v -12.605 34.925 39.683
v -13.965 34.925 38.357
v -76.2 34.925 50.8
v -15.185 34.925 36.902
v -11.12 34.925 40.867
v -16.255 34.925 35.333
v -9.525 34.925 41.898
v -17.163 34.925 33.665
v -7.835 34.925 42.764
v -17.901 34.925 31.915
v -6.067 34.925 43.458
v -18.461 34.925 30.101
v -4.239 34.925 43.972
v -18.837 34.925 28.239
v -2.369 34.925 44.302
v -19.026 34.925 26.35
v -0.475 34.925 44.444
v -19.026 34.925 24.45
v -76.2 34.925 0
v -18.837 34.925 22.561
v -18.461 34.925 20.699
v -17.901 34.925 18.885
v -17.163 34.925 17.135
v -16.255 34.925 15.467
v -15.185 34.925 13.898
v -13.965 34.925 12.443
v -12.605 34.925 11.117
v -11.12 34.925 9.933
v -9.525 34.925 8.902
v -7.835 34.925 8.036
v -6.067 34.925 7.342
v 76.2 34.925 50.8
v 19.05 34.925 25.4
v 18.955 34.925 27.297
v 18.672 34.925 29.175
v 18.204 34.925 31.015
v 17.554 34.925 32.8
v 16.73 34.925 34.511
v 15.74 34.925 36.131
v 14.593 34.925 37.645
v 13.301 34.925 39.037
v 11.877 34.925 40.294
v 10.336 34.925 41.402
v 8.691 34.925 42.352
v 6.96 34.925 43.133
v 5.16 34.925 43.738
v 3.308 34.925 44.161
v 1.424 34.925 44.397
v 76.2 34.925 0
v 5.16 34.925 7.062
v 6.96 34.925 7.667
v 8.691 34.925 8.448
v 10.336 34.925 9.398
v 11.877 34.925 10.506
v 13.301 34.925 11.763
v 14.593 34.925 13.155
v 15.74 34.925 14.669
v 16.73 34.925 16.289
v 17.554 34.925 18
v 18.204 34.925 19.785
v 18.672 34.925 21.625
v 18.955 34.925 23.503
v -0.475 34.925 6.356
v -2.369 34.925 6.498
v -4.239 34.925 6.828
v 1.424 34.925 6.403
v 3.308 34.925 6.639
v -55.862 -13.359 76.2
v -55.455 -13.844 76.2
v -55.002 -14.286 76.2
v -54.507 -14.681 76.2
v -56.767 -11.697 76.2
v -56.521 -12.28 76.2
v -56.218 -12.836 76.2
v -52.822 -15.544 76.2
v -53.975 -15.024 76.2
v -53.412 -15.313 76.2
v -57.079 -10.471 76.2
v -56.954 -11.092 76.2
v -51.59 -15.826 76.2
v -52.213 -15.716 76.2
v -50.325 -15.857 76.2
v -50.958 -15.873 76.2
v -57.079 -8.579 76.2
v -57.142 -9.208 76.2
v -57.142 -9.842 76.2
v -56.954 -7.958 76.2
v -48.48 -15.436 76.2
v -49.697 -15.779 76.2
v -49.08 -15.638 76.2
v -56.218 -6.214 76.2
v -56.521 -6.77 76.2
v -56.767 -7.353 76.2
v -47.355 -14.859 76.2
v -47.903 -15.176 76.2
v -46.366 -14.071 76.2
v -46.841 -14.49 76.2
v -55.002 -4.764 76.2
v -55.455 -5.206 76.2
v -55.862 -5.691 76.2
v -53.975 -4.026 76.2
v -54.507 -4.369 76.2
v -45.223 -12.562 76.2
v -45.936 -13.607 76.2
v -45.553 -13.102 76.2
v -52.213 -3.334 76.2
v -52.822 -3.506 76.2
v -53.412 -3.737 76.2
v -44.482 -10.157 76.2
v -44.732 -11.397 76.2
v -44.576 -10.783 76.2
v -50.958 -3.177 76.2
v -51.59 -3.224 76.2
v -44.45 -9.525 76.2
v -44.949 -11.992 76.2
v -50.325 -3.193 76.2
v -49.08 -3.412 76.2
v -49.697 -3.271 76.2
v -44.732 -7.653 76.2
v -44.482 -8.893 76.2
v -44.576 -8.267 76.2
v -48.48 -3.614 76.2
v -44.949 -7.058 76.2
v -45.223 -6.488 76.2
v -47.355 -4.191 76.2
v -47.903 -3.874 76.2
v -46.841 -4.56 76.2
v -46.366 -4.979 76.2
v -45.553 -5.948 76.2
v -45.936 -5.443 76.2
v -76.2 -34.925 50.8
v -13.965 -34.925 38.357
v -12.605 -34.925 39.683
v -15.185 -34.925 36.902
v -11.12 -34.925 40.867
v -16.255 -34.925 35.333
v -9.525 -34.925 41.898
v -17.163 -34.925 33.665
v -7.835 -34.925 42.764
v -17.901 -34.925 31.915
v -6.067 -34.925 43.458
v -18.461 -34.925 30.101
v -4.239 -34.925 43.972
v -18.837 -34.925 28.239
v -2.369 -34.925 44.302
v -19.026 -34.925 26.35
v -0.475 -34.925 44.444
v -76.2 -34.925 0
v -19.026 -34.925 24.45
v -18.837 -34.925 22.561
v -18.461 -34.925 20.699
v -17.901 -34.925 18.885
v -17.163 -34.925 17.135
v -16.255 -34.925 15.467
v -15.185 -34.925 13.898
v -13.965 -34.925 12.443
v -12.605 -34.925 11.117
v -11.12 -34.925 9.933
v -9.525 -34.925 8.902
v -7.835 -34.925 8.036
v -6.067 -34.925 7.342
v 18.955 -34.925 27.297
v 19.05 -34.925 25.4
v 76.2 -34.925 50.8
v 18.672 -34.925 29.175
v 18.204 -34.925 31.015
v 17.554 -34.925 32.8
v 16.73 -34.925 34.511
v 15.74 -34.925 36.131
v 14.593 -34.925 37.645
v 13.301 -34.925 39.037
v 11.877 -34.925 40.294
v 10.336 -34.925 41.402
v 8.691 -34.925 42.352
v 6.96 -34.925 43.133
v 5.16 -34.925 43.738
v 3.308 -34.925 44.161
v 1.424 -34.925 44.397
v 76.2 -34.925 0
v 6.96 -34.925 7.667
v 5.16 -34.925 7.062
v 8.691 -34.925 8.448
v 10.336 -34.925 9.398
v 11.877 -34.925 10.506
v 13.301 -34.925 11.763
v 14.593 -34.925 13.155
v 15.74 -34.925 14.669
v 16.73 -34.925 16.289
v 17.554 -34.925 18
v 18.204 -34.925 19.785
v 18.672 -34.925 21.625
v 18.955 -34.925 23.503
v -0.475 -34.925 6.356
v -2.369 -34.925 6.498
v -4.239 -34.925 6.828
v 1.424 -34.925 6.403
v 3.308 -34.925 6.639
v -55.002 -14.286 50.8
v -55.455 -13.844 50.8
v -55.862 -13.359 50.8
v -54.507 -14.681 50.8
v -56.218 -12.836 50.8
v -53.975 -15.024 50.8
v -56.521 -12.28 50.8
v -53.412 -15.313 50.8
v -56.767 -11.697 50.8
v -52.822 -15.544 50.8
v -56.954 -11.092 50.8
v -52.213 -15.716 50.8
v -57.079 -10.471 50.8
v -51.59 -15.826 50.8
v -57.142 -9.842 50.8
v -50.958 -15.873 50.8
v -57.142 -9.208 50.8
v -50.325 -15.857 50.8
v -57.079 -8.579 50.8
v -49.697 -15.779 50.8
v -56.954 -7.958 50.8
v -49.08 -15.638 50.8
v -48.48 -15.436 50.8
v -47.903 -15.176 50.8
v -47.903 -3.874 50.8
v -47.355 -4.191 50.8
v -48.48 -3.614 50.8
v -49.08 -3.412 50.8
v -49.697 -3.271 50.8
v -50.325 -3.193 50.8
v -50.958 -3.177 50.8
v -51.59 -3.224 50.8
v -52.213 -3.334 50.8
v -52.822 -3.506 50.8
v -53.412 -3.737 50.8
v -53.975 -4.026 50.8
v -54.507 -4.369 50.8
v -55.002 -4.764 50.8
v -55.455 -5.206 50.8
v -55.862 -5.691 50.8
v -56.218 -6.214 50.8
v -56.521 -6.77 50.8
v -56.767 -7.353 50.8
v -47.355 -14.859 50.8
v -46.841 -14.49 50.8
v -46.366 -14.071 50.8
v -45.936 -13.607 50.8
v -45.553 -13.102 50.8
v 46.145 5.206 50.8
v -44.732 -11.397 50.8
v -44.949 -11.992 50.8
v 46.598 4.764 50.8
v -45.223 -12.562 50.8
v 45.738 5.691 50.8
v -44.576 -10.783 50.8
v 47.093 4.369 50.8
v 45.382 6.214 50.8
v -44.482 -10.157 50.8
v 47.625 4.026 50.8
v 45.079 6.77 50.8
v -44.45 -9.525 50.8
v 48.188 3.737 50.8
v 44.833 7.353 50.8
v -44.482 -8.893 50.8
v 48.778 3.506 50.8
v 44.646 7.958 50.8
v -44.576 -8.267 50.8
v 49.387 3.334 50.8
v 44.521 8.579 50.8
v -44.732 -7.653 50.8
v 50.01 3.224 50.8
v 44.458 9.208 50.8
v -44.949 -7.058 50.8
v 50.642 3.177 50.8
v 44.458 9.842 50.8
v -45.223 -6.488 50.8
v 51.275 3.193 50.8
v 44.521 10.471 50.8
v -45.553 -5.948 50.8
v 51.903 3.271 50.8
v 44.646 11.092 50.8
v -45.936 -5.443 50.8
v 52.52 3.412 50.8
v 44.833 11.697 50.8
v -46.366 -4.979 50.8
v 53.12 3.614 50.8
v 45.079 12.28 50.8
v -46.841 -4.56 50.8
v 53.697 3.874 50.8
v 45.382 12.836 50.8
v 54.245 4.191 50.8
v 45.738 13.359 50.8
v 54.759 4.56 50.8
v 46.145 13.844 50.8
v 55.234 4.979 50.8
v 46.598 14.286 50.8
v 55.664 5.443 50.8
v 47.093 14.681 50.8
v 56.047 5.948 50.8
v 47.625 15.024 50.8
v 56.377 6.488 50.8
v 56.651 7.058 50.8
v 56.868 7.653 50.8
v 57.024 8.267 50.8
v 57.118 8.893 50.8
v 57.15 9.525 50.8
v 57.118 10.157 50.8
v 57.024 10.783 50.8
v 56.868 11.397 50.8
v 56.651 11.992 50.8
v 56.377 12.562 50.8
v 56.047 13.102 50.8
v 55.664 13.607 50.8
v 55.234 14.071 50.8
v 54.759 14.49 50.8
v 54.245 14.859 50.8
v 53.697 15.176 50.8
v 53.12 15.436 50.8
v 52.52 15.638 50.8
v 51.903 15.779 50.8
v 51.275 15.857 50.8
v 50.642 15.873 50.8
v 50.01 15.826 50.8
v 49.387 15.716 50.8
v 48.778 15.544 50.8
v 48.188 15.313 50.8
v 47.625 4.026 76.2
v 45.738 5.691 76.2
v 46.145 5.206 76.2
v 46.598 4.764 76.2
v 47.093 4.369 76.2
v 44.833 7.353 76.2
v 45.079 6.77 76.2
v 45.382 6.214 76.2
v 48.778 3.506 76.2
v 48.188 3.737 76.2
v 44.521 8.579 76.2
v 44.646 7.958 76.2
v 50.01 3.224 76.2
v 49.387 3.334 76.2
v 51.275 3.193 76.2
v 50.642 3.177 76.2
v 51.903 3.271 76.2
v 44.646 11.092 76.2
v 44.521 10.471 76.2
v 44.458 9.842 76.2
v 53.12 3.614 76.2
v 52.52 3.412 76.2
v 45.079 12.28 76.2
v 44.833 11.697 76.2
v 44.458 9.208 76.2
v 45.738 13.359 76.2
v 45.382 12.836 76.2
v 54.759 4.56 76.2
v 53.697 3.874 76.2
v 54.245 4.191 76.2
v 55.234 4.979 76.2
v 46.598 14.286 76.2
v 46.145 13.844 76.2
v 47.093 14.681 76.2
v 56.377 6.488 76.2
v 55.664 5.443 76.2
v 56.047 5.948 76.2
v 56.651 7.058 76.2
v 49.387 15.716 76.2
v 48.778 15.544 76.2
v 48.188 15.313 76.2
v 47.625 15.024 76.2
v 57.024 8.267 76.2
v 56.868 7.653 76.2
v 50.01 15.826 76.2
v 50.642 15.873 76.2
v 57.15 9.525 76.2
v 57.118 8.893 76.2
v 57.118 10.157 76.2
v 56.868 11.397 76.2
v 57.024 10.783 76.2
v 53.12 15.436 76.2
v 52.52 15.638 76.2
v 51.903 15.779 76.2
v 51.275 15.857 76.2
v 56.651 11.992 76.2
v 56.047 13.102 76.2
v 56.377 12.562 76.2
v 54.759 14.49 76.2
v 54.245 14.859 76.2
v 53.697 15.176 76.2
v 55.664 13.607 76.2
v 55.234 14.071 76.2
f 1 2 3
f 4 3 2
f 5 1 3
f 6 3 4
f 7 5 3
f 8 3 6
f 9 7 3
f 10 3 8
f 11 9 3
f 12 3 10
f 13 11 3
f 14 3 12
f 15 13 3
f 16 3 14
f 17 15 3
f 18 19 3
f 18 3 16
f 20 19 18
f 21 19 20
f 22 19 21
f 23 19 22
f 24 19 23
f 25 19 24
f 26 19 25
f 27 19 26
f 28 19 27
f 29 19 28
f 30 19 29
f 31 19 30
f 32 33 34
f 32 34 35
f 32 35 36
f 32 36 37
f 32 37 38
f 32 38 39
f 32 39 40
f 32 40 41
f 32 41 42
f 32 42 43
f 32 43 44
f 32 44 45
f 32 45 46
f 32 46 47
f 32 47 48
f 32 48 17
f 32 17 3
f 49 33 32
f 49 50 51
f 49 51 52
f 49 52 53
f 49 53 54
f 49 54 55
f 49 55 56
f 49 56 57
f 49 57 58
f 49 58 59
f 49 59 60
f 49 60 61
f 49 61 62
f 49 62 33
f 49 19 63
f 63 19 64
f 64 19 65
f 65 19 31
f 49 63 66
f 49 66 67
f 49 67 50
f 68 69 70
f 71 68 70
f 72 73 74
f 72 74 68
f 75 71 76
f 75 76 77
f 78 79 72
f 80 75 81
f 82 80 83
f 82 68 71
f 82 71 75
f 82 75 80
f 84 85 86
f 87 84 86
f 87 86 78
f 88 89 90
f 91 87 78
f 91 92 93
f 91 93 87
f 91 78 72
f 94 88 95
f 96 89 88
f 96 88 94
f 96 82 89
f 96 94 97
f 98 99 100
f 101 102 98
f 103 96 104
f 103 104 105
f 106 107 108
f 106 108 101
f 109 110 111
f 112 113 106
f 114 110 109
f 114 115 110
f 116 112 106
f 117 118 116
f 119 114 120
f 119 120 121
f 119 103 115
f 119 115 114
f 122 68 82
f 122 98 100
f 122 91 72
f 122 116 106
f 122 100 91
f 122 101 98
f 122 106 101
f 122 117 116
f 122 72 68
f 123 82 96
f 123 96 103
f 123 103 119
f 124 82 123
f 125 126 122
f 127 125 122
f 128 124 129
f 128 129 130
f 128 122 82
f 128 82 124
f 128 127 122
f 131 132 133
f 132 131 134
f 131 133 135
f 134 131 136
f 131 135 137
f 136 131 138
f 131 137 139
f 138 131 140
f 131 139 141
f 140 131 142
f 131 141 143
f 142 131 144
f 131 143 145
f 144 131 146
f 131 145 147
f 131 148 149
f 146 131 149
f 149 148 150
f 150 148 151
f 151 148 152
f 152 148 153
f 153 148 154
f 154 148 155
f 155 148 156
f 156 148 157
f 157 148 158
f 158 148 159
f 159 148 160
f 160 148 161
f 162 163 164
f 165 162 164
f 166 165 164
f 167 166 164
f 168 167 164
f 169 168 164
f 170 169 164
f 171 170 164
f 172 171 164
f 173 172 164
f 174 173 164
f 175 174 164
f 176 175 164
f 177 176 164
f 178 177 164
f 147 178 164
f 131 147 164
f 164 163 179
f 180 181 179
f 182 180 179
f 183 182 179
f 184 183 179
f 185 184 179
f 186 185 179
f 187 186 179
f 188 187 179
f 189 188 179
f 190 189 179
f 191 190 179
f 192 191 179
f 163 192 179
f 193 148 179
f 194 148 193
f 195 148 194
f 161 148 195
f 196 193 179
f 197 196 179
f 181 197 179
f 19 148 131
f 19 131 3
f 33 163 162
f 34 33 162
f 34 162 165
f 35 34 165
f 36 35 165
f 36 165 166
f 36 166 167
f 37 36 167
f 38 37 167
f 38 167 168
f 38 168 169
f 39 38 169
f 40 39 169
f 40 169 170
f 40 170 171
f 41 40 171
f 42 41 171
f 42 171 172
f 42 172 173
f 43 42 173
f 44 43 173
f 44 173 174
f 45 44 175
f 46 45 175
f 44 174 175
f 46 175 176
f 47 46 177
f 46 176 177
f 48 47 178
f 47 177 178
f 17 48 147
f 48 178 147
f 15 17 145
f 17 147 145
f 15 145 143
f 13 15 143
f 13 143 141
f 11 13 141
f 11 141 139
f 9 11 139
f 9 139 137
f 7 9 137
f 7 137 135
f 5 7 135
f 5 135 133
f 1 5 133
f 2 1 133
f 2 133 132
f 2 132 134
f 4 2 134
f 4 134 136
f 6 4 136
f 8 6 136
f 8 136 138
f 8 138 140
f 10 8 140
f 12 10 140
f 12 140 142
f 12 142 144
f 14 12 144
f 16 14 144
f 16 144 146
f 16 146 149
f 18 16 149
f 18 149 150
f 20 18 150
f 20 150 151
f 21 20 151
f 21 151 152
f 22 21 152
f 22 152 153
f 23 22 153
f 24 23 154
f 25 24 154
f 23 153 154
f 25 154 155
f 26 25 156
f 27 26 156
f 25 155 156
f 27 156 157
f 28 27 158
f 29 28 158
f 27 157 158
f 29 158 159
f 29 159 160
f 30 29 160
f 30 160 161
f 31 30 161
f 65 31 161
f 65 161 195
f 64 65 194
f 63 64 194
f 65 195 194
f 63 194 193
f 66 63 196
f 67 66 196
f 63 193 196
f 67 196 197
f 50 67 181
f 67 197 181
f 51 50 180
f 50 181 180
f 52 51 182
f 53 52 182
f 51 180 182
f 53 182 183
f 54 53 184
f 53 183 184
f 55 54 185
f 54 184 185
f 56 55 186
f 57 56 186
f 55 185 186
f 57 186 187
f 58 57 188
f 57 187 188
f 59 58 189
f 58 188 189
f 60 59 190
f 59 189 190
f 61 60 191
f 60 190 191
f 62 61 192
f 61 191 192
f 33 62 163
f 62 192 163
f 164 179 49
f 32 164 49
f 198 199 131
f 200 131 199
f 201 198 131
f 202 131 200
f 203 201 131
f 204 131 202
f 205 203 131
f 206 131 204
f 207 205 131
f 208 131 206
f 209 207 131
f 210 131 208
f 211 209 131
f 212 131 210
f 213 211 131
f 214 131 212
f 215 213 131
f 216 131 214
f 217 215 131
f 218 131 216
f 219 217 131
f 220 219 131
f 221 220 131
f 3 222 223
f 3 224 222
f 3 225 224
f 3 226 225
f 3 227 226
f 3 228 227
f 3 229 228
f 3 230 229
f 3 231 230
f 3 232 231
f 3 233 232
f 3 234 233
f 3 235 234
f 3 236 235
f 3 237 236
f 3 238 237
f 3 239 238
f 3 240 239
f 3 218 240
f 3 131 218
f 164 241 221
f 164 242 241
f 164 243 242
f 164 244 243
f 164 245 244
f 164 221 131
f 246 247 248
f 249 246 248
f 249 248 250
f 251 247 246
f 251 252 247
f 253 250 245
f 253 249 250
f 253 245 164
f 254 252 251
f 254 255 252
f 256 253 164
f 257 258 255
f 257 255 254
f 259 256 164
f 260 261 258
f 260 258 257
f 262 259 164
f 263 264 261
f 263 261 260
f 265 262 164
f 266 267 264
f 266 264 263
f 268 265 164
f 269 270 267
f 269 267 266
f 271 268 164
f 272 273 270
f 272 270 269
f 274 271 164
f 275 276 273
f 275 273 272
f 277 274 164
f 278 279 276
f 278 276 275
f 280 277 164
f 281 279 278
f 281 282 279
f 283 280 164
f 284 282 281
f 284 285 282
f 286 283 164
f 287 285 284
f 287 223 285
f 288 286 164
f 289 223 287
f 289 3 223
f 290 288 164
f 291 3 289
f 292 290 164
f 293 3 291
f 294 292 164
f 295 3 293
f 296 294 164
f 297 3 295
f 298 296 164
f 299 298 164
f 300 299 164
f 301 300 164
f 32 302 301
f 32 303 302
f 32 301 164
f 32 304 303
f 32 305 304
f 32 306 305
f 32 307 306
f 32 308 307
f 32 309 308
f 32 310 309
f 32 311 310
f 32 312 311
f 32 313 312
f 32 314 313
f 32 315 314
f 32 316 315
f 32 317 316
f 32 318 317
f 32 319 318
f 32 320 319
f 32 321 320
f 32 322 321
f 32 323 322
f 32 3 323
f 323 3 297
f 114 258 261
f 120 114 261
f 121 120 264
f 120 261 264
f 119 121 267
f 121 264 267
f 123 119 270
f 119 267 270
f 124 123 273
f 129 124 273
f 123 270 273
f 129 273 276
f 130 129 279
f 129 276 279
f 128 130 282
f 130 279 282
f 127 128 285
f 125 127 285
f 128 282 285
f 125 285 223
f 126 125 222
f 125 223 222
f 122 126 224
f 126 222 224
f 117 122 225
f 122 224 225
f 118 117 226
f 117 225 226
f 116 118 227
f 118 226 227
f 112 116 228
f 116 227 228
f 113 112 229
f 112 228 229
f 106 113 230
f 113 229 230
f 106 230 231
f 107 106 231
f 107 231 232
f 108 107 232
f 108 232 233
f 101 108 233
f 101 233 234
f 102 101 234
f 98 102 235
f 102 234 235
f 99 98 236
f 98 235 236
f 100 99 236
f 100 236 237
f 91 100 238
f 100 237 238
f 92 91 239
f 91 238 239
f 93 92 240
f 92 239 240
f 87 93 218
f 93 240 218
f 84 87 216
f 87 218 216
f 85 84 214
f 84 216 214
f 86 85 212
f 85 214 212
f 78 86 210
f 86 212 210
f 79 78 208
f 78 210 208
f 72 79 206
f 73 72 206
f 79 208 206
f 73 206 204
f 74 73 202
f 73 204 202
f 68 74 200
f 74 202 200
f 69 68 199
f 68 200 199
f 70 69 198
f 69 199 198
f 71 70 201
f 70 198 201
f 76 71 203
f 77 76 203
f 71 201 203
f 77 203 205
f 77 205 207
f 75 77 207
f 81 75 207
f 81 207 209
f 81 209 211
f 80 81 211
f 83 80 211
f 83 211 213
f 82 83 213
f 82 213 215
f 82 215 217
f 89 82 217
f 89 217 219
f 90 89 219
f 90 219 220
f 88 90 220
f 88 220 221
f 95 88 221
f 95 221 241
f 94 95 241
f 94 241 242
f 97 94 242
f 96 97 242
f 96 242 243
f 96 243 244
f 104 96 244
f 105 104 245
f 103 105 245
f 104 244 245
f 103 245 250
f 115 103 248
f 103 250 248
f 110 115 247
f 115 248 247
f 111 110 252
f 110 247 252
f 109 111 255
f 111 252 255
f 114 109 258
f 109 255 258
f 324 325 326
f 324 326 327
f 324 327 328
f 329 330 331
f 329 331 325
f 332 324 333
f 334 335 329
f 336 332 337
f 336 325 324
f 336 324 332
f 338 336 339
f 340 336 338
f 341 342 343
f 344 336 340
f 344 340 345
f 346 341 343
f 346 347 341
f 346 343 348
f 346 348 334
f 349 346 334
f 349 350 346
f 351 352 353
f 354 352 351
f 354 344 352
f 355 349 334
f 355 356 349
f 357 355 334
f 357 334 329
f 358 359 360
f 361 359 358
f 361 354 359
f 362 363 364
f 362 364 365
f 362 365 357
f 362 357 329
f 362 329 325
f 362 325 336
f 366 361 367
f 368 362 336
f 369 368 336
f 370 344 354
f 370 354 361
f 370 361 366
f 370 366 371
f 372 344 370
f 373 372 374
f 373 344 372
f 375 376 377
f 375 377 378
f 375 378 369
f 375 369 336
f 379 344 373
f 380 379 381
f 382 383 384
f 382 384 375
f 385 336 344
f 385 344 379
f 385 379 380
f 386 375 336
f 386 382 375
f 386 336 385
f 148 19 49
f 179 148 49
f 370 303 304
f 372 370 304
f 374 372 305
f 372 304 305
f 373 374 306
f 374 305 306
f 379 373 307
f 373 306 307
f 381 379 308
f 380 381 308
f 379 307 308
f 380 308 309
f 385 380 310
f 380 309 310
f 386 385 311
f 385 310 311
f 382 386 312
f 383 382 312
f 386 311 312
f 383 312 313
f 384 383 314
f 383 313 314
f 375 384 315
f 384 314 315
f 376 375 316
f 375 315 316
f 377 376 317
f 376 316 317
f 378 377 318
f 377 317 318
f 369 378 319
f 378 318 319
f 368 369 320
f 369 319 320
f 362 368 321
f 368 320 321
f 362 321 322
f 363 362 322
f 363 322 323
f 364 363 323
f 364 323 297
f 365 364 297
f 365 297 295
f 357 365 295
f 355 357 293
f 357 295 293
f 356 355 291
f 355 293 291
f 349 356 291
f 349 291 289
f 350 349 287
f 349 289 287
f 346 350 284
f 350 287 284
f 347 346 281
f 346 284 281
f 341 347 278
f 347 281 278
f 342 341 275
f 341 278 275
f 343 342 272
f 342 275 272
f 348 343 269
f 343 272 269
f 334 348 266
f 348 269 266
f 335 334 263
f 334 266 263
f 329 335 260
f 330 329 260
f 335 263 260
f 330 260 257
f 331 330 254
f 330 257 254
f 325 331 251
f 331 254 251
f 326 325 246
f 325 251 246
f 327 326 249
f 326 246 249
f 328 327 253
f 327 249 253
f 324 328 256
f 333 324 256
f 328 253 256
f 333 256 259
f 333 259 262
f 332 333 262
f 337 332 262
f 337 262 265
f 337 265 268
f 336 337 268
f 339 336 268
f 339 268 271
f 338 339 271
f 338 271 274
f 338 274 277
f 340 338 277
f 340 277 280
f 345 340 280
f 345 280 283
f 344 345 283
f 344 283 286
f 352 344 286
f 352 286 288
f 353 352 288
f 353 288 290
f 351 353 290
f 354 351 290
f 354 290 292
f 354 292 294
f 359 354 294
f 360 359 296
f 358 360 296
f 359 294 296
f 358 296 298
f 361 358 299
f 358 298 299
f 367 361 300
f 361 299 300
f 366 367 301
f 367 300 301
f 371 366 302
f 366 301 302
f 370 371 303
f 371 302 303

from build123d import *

# Parameters (mm, degrees)
F0_W     = 152.4
F0_H     = 69.85
F1_DEPTH = 50.8
F2_R     = 19.05
F3_DEPTH = 201.422
F4_R     = 6.35
F5_DEPTH = 25.4


with BuildPart() as f1:
    # F0 (on Top) → F1 (new body)
    with BuildSketch(Plane.XY):
        Rectangle(F0_W, F0_H)
    extrude(amount=F1_DEPTH)

    # F2 (on face) → F3 (cut)
    with BuildSketch(Plane.XZ.offset(34.925)):
        with Locations((0, 25.4)):
            Circle(F2_R)
    extrude(amount=-F3_DEPTH, mode=Mode.SUBTRACT)

    # F4 (on face) → F5 (join)
    with BuildSketch(Plane.XY.offset(50.8)):
        with Locations((50.8, 9.525)):
            Circle(F4_R)
        with Locations((-50.8, -9.525)):
            Circle(F4_R)
    extrude(amount=F5_DEPTH)


solid = f1.part
